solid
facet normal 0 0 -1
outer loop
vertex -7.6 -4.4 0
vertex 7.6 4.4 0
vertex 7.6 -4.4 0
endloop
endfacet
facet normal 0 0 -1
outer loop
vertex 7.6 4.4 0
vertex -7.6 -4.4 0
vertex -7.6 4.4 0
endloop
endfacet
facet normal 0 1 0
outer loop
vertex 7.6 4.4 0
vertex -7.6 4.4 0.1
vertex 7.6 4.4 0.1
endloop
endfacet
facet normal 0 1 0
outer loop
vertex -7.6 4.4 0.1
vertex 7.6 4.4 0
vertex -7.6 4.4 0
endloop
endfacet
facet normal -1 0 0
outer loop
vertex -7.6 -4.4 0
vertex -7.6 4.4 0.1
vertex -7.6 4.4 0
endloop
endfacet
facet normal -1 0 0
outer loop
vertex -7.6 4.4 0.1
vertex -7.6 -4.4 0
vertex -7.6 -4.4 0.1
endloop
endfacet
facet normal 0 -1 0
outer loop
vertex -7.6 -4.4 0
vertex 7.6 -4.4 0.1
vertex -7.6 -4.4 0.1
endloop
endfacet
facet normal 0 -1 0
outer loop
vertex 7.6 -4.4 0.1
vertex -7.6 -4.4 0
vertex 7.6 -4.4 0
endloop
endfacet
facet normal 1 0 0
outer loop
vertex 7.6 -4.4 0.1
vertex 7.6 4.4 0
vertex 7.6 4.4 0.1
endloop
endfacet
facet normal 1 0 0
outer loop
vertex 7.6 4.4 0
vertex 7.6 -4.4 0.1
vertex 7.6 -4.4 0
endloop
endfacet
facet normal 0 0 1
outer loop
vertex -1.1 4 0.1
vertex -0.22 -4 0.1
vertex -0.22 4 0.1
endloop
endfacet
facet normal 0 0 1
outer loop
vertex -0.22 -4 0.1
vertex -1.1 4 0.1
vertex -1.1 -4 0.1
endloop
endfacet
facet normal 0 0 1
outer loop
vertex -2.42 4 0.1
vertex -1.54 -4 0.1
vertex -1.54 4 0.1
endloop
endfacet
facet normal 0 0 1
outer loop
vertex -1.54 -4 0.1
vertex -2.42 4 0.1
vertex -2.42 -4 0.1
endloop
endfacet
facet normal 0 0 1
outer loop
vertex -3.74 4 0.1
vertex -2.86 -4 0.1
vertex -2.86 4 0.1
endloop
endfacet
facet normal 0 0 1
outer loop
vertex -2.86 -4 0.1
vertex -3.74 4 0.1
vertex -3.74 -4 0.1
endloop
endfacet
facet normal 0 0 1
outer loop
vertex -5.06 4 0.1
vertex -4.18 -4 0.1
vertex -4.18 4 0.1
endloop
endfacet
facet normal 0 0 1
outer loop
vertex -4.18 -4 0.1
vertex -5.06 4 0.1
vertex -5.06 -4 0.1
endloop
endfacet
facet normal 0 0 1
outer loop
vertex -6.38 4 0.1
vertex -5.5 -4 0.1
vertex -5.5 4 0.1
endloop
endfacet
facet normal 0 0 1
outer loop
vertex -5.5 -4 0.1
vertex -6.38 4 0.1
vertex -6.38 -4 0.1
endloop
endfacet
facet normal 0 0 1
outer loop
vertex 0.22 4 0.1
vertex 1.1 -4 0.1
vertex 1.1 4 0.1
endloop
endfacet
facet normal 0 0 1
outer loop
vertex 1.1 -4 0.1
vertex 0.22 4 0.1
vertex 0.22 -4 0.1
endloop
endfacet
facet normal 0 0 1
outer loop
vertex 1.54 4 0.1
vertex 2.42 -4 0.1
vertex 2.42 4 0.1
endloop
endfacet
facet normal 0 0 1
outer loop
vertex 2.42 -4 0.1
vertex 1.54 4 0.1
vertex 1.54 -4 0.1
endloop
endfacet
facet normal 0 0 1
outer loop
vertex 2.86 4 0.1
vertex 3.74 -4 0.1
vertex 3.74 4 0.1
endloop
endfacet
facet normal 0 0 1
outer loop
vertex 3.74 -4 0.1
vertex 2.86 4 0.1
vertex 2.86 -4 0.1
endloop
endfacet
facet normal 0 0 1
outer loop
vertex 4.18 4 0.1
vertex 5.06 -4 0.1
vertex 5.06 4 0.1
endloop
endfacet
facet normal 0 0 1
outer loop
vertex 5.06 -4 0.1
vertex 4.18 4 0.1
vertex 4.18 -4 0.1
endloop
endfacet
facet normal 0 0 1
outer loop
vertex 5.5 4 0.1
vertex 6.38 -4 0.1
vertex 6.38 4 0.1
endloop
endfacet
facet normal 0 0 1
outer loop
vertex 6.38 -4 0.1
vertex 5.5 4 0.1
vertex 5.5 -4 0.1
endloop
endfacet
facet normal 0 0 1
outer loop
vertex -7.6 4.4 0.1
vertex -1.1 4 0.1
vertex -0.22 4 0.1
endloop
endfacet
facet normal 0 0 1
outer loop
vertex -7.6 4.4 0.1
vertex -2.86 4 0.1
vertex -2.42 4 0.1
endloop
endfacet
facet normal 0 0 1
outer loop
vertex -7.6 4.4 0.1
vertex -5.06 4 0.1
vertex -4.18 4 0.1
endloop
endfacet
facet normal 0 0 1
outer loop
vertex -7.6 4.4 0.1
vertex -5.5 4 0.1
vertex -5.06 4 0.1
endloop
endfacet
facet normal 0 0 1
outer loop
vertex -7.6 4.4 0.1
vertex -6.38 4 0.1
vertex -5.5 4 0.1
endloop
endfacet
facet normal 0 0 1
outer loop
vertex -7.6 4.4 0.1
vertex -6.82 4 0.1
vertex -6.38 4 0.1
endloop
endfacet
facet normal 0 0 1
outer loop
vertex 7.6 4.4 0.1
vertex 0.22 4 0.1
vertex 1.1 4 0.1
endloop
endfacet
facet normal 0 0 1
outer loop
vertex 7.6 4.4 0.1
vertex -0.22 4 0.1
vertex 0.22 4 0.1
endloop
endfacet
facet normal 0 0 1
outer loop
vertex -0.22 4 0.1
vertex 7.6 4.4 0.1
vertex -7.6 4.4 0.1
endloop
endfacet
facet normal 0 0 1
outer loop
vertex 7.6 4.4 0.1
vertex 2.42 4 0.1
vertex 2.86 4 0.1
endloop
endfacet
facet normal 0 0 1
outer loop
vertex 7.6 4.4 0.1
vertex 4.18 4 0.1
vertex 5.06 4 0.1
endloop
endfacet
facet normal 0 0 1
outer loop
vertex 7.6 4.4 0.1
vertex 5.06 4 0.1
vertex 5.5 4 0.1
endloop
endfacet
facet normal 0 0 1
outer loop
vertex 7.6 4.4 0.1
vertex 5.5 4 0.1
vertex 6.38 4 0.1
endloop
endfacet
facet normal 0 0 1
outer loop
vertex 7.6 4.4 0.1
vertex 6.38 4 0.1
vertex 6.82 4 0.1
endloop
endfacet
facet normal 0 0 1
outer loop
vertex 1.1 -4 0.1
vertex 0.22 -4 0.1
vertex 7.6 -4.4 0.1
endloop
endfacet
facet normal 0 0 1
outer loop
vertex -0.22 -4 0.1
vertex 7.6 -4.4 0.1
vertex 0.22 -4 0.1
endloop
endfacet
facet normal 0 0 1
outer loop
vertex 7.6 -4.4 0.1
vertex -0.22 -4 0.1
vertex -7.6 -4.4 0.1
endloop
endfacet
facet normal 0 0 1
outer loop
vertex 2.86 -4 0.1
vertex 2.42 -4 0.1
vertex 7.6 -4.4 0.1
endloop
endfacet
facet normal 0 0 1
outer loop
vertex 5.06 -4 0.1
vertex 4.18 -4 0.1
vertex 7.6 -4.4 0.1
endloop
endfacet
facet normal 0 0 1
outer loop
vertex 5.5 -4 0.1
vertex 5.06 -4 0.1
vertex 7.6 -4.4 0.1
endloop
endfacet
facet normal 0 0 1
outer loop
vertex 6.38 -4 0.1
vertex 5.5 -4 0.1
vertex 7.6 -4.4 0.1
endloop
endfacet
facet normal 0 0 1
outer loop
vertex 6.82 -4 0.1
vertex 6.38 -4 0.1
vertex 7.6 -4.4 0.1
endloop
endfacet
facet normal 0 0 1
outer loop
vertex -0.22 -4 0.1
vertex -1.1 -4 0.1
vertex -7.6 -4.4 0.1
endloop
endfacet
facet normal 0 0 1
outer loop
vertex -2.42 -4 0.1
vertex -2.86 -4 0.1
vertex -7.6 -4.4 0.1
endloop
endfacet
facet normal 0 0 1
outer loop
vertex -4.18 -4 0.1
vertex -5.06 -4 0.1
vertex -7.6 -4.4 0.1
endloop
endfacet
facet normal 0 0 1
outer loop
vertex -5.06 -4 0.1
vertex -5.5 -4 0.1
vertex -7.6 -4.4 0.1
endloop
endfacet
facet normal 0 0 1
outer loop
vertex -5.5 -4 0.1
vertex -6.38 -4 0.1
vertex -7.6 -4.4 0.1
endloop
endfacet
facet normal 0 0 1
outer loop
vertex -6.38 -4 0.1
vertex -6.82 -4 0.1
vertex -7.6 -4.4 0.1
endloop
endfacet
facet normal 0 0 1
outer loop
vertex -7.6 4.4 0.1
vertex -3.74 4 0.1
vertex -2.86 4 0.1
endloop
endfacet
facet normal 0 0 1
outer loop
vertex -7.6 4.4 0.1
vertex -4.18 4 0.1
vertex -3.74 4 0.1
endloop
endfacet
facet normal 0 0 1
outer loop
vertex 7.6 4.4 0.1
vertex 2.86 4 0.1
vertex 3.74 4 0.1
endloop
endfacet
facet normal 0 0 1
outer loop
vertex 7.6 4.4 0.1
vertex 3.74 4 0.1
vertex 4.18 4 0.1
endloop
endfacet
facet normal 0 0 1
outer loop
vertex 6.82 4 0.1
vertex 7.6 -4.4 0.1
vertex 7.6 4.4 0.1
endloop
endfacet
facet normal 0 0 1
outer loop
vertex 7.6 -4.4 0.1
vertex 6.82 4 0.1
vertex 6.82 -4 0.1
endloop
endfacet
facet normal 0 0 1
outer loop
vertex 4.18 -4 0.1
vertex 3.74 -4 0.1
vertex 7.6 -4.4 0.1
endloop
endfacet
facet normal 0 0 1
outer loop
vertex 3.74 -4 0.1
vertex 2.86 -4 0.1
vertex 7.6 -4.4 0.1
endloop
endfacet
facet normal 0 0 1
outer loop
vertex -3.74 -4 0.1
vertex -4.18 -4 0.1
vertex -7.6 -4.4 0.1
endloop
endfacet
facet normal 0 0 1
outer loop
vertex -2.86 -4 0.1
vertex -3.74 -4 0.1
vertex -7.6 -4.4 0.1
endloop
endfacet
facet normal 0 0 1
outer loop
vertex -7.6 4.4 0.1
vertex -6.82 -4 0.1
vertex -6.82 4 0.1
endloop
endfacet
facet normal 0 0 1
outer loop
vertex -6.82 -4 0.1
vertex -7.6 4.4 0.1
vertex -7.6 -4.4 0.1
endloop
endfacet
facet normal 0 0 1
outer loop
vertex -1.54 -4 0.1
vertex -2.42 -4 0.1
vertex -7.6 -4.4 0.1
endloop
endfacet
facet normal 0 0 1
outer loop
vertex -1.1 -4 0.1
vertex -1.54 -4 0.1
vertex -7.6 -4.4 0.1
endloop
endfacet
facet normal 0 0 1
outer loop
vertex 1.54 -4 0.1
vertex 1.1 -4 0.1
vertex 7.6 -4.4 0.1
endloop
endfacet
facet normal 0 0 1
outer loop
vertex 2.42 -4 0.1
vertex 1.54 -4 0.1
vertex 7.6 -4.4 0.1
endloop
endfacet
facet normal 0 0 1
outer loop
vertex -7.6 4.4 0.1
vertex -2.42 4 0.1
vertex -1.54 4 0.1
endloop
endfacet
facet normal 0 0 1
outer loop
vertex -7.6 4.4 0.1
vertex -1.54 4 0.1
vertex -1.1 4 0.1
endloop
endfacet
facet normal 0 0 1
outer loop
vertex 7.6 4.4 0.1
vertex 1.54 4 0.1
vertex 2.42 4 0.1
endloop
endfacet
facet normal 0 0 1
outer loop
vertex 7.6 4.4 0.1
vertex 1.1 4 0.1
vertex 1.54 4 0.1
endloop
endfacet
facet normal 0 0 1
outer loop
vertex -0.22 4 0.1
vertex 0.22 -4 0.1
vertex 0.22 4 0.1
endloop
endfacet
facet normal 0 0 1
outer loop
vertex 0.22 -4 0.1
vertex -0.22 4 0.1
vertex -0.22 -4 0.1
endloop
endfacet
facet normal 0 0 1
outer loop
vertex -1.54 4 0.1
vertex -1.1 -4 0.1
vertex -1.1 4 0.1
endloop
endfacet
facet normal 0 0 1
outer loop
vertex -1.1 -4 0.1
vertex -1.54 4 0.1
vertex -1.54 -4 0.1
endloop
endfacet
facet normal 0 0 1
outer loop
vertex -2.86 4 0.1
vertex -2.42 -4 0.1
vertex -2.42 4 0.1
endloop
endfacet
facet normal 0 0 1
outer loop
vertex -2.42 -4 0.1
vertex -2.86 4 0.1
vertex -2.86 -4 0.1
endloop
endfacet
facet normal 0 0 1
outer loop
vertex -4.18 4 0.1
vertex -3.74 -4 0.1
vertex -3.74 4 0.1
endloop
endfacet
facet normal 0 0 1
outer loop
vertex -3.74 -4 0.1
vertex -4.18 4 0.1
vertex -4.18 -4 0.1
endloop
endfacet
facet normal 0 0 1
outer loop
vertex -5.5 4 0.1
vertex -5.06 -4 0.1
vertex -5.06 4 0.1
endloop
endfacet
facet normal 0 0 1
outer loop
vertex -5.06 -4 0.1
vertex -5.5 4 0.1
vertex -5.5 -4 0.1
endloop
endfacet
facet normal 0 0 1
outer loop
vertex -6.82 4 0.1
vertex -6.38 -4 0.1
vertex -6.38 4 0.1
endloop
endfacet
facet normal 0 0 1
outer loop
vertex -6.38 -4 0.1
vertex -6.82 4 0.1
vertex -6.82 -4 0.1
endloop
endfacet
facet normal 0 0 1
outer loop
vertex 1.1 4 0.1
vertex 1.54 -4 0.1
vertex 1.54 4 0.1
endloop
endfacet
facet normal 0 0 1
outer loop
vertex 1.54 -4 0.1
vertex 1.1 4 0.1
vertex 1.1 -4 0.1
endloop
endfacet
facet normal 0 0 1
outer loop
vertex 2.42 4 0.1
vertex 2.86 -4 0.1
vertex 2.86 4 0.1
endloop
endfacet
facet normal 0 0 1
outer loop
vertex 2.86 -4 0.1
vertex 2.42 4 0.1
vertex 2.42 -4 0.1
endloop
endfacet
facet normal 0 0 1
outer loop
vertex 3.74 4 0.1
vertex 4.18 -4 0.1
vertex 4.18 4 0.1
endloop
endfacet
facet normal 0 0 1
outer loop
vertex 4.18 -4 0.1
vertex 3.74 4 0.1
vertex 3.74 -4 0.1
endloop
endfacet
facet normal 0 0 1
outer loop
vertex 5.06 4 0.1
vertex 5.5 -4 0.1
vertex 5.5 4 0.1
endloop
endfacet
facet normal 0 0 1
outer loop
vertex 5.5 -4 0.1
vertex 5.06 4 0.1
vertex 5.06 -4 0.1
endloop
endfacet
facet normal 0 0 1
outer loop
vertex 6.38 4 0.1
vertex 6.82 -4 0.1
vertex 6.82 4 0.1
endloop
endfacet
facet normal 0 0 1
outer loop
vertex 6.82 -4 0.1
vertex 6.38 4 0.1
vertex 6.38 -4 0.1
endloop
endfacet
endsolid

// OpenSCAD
// file: ../p/box5-12.scad
use <../lib.scad>
function ldraw_lib__box5_12() = [
// 0 Box with 5 Faces without Any Edges
// 0 Name: box5-12.dat
// 0 Author: Chris Dee [cwdee]
// 0 !LDRAW_ORG Primitive UPDATE 2009-02
// 0 !LICENSE Licensed under CC BY 2.0 and CC BY 4.0 : see CAreadme.txt
// 
// 0 BFC CERTIFY CCW
  [0,"BFC","CERTIFY"],
  [0,"BFC","CCW"],
// 
// 0 !HISTORY 2009-09-03 [PTadmin] Official Update 2009-02
// 
// 
// 4 16 1 1 1 1 1 -1 -1 1 -1 -1 1 1
  [4,16,1,1,1,1,1,-1,-1,1,-1,-1,1,1],
// 4 16 -1 0 1 1 0 1 1 1 1 -1 1 1
  [4,16,-1,0,1,1,0,1,1,1,1,-1,1,1],
// 4 16 -1 0 -1 -1 0 1 -1 1 1 -1 1 -1
  [4,16,-1,0,-1,-1,0,1,-1,1,1,-1,1,-1],
// 4 16 1 0 -1 -1 0 -1 -1 1 -1 1 1 -1
  [4,16,1,0,-1,-1,0,-1,-1,1,-1,1,1,-1],
// 4 16 1 0 1 1 0 -1 1 1 -1 1 1 1
  [4,16,1,0,1,1,0,-1,1,1,-1,1,1,1],
// 0
];
module ldraw_lib__box5_12(step=0, col=false, unit=2/5, alt=false, line=0.2, solid=!$preview)
    makepoly(ldraw_lib__box5_12(), step=step, col=col, unit=unit, alt=alt, line=line, solid=solid);
ldraw_lib__box5_12(line=0.2);
// main file
use <../lib.scad>
use <../p/box5-12.scad>
function ldraw_lib__168335o() = [
// 0 Sticker  1.1 x  1.9 with 11 Grey Stripes on Clear Background
// 0 Name: 168335o.dat
// 0 Author: Ulrich Röder [UR]
// 0 !LDRAW_ORG Part UPDATE 2018-02
// 0 !LICENSE Licensed under CC BY 2.0 and CC BY 4.0 : see CAreadme.txt
// 
// 0 BFC CERTIFY CCW
  [0,"BFC","CERTIFY"],
  [0,"BFC","CCW"],
// 
// 0 !KEYWORDS Set 5591
// 
// 0 !HISTORY 2018-12-08 [PTadmin] Official Update 2018-02
// 
// 
// 1 16 0 -0.25 0 19 0 0 0 0.25 0 0 0 11 box5-12.dat
  [1,16,0,-0.25,0,19,0,0,0,0.25,0,0,0,11, ldraw_lib__box5_12()],
// 4 16 -.55 -.25 10 -2.75 -.25 10 -2.75 -.25 -10 -.55 -.25 -10
  [4,16,-.55,-.25,10,-2.75,-.25,10,-2.75,-.25,-10,-.55,-.25,-10],
// 4 16 -3.85 -.25 10 -6.05 -.25 10 -6.05 -.25 -10 -3.85 -.25 -10
  [4,16,-3.85,-.25,10,-6.05,-.25,10,-6.05,-.25,-10,-3.85,-.25,-10],
// 4 16 -7.15 -.25 10 -9.35 -.25 10 -9.35 -.25 -10 -7.15 -.25 -10
  [4,16,-7.15,-.25,10,-9.35,-.25,10,-9.35,-.25,-10,-7.15,-.25,-10],
// 4 16 -10.45 -.25 10 -12.65 -.25 10 -12.65 -.25 -10 -10.45 -.25 -10
  [4,16,-10.45,-.25,10,-12.65,-.25,10,-12.65,-.25,-10,-10.45,-.25,-10],
// 4 16 -13.75 -.25 10 -15.95 -.25 10 -15.95 -.25 -10 -13.75 -.25 -10
  [4,16,-13.75,-.25,10,-15.95,-.25,10,-15.95,-.25,-10,-13.75,-.25,-10],
// 4 16 .55 -.25 -10 2.75 -.25 -10 2.75 -.25 10 .55 -.25 10
  [4,16,.55,-.25,-10,2.75,-.25,-10,2.75,-.25,10,.55,-.25,10],
// 4 16 3.85 -.25 -10 6.05 -.25 -10 6.05 -.25 10 3.85 -.25 10
  [4,16,3.85,-.25,-10,6.05,-.25,-10,6.05,-.25,10,3.85,-.25,10],
// 4 16 7.15 -.25 -10 9.35 -.25 -10 9.35 -.25 10 7.15 -.25 10
  [4,16,7.15,-.25,-10,9.35,-.25,-10,9.35,-.25,10,7.15,-.25,10],
// 4 16 10.45 -.25 -10 12.65 -.25 -10 12.65 -.25 10 10.45 -.25 10
  [4,16,10.45,-.25,-10,12.65,-.25,-10,12.65,-.25,10,10.45,-.25,10],
// 4 16 13.75 -.25 -10 15.95 -.25 -10 15.95 -.25 10 13.75 -.25 10
  [4,16,13.75,-.25,-10,15.95,-.25,-10,15.95,-.25,10,13.75,-.25,10],
// 3 16 -19 -.25 11 -2.75 -.25 10 -.55 -.25 10
  [3,16,-19,-.25,11,-2.75,-.25,10,-.55,-.25,10],
// 3 16 -19 -.25 11 -7.15 -.25 10 -6.05 -.25 10
  [3,16,-19,-.25,11,-7.15,-.25,10,-6.05,-.25,10],
// 3 16 -19 -.25 11 -12.65 -.25 10 -10.45 -.25 10
  [3,16,-19,-.25,11,-12.65,-.25,10,-10.45,-.25,10],
// 3 16 -19 -.25 11 -13.75 -.25 10 -12.65 -.25 10
  [3,16,-19,-.25,11,-13.75,-.25,10,-12.65,-.25,10],
// 3 16 -19 -.25 11 -15.95 -.25 10 -13.75 -.25 10
  [3,16,-19,-.25,11,-15.95,-.25,10,-13.75,-.25,10],
// 3 16 -19 -.25 11 -17.05 -.25 10 -15.95 -.25 10
  [3,16,-19,-.25,11,-17.05,-.25,10,-15.95,-.25,10],
// 3 16 19 -.25 11 .55 -.25 10 2.75 -.25 10
  [3,16,19,-.25,11,.55,-.25,10,2.75,-.25,10],
// 4 16 .55 -.25 10 19 -.25 11 -19 -.25 11 -.55 -.25 10
  [4,16,.55,-.25,10,19,-.25,11,-19,-.25,11,-.55,-.25,10],
// 3 16 19 -.25 11 6.05 -.25 10 7.15 -.25 10
  [3,16,19,-.25,11,6.05,-.25,10,7.15,-.25,10],
// 3 16 19 -.25 11 10.45 -.25 10 12.65 -.25 10
  [3,16,19,-.25,11,10.45,-.25,10,12.65,-.25,10],
// 3 16 19 -.25 11 12.65 -.25 10 13.75 -.25 10
  [3,16,19,-.25,11,12.65,-.25,10,13.75,-.25,10],
// 3 16 19 -.25 11 13.75 -.25 10 15.95 -.25 10
  [3,16,19,-.25,11,13.75,-.25,10,15.95,-.25,10],
// 3 16 19 -.25 11 15.95 -.25 10 17.05 -.25 10
  [3,16,19,-.25,11,15.95,-.25,10,17.05,-.25,10],
// 3 16 2.75 -.25 -10 .55 -.25 -10 19 -.25 -11
  [3,16,2.75,-.25,-10,.55,-.25,-10,19,-.25,-11],
// 4 16 -19 -.25 -11 19 -.25 -11 .55 -.25 -10 -.55 -.25 -10
  [4,16,-19,-.25,-11,19,-.25,-11,.55,-.25,-10,-.55,-.25,-10],
// 3 16 7.15 -.25 -10 6.05 -.25 -10 19 -.25 -11
  [3,16,7.15,-.25,-10,6.05,-.25,-10,19,-.25,-11],
// 3 16 12.65 -.25 -10 10.45 -.25 -10 19 -.25 -11
  [3,16,12.65,-.25,-10,10.45,-.25,-10,19,-.25,-11],
// 3 16 13.75 -.25 -10 12.65 -.25 -10 19 -.25 -11
  [3,16,13.75,-.25,-10,12.65,-.25,-10,19,-.25,-11],
// 3 16 15.95 -.25 -10 13.75 -.25 -10 19 -.25 -11
  [3,16,15.95,-.25,-10,13.75,-.25,-10,19,-.25,-11],
// 3 16 17.05 -.25 -10 15.95 -.25 -10 19 -.25 -11
  [3,16,17.05,-.25,-10,15.95,-.25,-10,19,-.25,-11],
// 3 16 -.55 -.25 -10 -2.75 -.25 -10 -19 -.25 -11
  [3,16,-.55,-.25,-10,-2.75,-.25,-10,-19,-.25,-11],
// 3 16 -6.05 -.25 -10 -7.15 -.25 -10 -19 -.25 -11
  [3,16,-6.05,-.25,-10,-7.15,-.25,-10,-19,-.25,-11],
// 3 16 -10.45 -.25 -10 -12.65 -.25 -10 -19 -.25 -11
  [3,16,-10.45,-.25,-10,-12.65,-.25,-10,-19,-.25,-11],
// 3 16 -12.65 -.25 -10 -13.75 -.25 -10 -19 -.25 -11
  [3,16,-12.65,-.25,-10,-13.75,-.25,-10,-19,-.25,-11],
// 3 16 -13.75 -.25 -10 -15.95 -.25 -10 -19 -.25 -11
  [3,16,-13.75,-.25,-10,-15.95,-.25,-10,-19,-.25,-11],
// 3 16 -15.95 -.25 -10 -17.05 -.25 -10 -19 -.25 -11
  [3,16,-15.95,-.25,-10,-17.05,-.25,-10,-19,-.25,-11],
// 3 16 -19 -.25 11 -9.35 -.25 10 -7.15 -.25 10
  [3,16,-19,-.25,11,-9.35,-.25,10,-7.15,-.25,10],
// 3 16 -19 -.25 11 -10.45 -.25 10 -9.35 -.25 10
  [3,16,-19,-.25,11,-10.45,-.25,10,-9.35,-.25,10],
// 3 16 19 -.25 11 7.15 -.25 10 9.35 -.25 10
  [3,16,19,-.25,11,7.15,-.25,10,9.35,-.25,10],
// 3 16 19 -.25 11 9.35 -.25 10 10.45 -.25 10
  [3,16,19,-.25,11,9.35,-.25,10,10.45,-.25,10],
// 4 16 19 -.25 -11 19 -.25 11 17.05 -.25 10 17.05 -.25 -10
  [4,16,19,-.25,-11,19,-.25,11,17.05,-.25,10,17.05,-.25,-10],
// 3 16 10.45 -.25 -10 9.35 -.25 -10 19 -.25 -11
  [3,16,10.45,-.25,-10,9.35,-.25,-10,19,-.25,-11],
// 3 16 9.35 -.25 -10 7.15 -.25 -10 19 -.25 -11
  [3,16,9.35,-.25,-10,7.15,-.25,-10,19,-.25,-11],
// 3 16 -9.35 -.25 -10 -10.45 -.25 -10 -19 -.25 -11
  [3,16,-9.35,-.25,-10,-10.45,-.25,-10,-19,-.25,-11],
// 3 16 -7.15 -.25 -10 -9.35 -.25 -10 -19 -.25 -11
  [3,16,-7.15,-.25,-10,-9.35,-.25,-10,-19,-.25,-11],
// 4 16 -17.05 -.25 10 -19 -.25 11 -19 -.25 -11 -17.05 -.25 -10
  [4,16,-17.05,-.25,10,-19,-.25,11,-19,-.25,-11,-17.05,-.25,-10],
// 3 16 -3.85 -.25 -10 -6.05 -.25 -10 -19 -.25 -11
  [3,16,-3.85,-.25,-10,-6.05,-.25,-10,-19,-.25,-11],
// 3 16 -2.75 -.25 -10 -3.85 -.25 -10 -19 -.25 -11
  [3,16,-2.75,-.25,-10,-3.85,-.25,-10,-19,-.25,-11],
// 3 16 3.85 -.25 -10 2.75 -.25 -10 19 -.25 -11
  [3,16,3.85,-.25,-10,2.75,-.25,-10,19,-.25,-11],
// 3 16 6.05 -.25 -10 3.85 -.25 -10 19 -.25 -11
  [3,16,6.05,-.25,-10,3.85,-.25,-10,19,-.25,-11],
// 3 16 -19 -.25 11 -6.05 -.25 10 -3.85 -.25 10
  [3,16,-19,-.25,11,-6.05,-.25,10,-3.85,-.25,10],
// 3 16 -19 -.25 11 -3.85 -.25 10 -2.75 -.25 10
  [3,16,-19,-.25,11,-3.85,-.25,10,-2.75,-.25,10],
// 3 16 19 -.25 11 3.85 -.25 10 6.05 -.25 10
  [3,16,19,-.25,11,3.85,-.25,10,6.05,-.25,10],
// 3 16 19 -.25 11 2.75 -.25 10 3.85 -.25 10
  [3,16,19,-.25,11,2.75,-.25,10,3.85,-.25,10],
// 
// 4 7 0.55 -0.25 10 -0.55 -0.25 10 -0.55 -0.25 -10 0.55 -0.25 -10
  [4,7,0.55,-0.25,10,-0.55,-0.25,10,-0.55,-0.25,-10,0.55,-0.25,-10],
// 4 7 -2.75 -0.25 10 -3.85 -0.25 10 -3.85 -0.25 -10 -2.75 -0.25 -10
  [4,7,-2.75,-0.25,10,-3.85,-0.25,10,-3.85,-0.25,-10,-2.75,-0.25,-10],
// 4 7 -6.05 -0.25 10 -7.15 -0.25 10 -7.15 -0.25 -10 -6.05 -0.25 -10
  [4,7,-6.05,-0.25,10,-7.15,-0.25,10,-7.15,-0.25,-10,-6.05,-0.25,-10],
// 4 7 -9.35 -0.25 10 -10.45 -0.25 10 -10.45 -0.25 -10 -9.35 -0.25 -10
  [4,7,-9.35,-0.25,10,-10.45,-0.25,10,-10.45,-0.25,-10,-9.35,-0.25,-10],
// 4 7 -12.65 -0.25 10 -13.75 -0.25 10 -13.75 -0.25 -10 -12.65 -0.25 -10
  [4,7,-12.65,-0.25,10,-13.75,-0.25,10,-13.75,-0.25,-10,-12.65,-0.25,-10],
// 4 7 -15.95 -0.25 10 -17.05 -0.25 10 -17.05 -0.25 -10 -15.95 -0.25 -10
  [4,7,-15.95,-0.25,10,-17.05,-0.25,10,-17.05,-0.25,-10,-15.95,-0.25,-10],
// 4 7 2.75 -0.25 -10 3.85 -0.25 -10 3.85 -0.25 10 2.75 -0.25 10
  [4,7,2.75,-0.25,-10,3.85,-0.25,-10,3.85,-0.25,10,2.75,-0.25,10],
// 4 7 6.05 -0.25 -10 7.15 -0.25 -10 7.15 -0.25 10 6.05 -0.25 10
  [4,7,6.05,-0.25,-10,7.15,-0.25,-10,7.15,-0.25,10,6.05,-0.25,10],
// 4 7 9.35 -0.25 -10 10.45 -0.25 -10 10.45 -0.25 10 9.35 -0.25 10
  [4,7,9.35,-0.25,-10,10.45,-0.25,-10,10.45,-0.25,10,9.35,-0.25,10],
// 4 7 12.65 -0.25 -10 13.75 -0.25 -10 13.75 -0.25 10 12.65 -0.25 10
  [4,7,12.65,-0.25,-10,13.75,-0.25,-10,13.75,-0.25,10,12.65,-0.25,10],
// 4 7 15.95 -0.25 -10 17.05 -0.25 -10 17.05 -0.25 10 15.95 -0.25 10
  [4,7,15.95,-0.25,-10,17.05,-0.25,-10,17.05,-0.25,10,15.95,-0.25,10],
];
module ldraw_lib__168335o(step=0, col=false, unit=2/5, alt=false, line=0.2, solid=!$preview)
    makepoly(ldraw_lib__168335o(), step=step, col=col, unit=unit, alt=alt, line=line, solid=solid);
ldraw_lib__168335o(line=0.2);
